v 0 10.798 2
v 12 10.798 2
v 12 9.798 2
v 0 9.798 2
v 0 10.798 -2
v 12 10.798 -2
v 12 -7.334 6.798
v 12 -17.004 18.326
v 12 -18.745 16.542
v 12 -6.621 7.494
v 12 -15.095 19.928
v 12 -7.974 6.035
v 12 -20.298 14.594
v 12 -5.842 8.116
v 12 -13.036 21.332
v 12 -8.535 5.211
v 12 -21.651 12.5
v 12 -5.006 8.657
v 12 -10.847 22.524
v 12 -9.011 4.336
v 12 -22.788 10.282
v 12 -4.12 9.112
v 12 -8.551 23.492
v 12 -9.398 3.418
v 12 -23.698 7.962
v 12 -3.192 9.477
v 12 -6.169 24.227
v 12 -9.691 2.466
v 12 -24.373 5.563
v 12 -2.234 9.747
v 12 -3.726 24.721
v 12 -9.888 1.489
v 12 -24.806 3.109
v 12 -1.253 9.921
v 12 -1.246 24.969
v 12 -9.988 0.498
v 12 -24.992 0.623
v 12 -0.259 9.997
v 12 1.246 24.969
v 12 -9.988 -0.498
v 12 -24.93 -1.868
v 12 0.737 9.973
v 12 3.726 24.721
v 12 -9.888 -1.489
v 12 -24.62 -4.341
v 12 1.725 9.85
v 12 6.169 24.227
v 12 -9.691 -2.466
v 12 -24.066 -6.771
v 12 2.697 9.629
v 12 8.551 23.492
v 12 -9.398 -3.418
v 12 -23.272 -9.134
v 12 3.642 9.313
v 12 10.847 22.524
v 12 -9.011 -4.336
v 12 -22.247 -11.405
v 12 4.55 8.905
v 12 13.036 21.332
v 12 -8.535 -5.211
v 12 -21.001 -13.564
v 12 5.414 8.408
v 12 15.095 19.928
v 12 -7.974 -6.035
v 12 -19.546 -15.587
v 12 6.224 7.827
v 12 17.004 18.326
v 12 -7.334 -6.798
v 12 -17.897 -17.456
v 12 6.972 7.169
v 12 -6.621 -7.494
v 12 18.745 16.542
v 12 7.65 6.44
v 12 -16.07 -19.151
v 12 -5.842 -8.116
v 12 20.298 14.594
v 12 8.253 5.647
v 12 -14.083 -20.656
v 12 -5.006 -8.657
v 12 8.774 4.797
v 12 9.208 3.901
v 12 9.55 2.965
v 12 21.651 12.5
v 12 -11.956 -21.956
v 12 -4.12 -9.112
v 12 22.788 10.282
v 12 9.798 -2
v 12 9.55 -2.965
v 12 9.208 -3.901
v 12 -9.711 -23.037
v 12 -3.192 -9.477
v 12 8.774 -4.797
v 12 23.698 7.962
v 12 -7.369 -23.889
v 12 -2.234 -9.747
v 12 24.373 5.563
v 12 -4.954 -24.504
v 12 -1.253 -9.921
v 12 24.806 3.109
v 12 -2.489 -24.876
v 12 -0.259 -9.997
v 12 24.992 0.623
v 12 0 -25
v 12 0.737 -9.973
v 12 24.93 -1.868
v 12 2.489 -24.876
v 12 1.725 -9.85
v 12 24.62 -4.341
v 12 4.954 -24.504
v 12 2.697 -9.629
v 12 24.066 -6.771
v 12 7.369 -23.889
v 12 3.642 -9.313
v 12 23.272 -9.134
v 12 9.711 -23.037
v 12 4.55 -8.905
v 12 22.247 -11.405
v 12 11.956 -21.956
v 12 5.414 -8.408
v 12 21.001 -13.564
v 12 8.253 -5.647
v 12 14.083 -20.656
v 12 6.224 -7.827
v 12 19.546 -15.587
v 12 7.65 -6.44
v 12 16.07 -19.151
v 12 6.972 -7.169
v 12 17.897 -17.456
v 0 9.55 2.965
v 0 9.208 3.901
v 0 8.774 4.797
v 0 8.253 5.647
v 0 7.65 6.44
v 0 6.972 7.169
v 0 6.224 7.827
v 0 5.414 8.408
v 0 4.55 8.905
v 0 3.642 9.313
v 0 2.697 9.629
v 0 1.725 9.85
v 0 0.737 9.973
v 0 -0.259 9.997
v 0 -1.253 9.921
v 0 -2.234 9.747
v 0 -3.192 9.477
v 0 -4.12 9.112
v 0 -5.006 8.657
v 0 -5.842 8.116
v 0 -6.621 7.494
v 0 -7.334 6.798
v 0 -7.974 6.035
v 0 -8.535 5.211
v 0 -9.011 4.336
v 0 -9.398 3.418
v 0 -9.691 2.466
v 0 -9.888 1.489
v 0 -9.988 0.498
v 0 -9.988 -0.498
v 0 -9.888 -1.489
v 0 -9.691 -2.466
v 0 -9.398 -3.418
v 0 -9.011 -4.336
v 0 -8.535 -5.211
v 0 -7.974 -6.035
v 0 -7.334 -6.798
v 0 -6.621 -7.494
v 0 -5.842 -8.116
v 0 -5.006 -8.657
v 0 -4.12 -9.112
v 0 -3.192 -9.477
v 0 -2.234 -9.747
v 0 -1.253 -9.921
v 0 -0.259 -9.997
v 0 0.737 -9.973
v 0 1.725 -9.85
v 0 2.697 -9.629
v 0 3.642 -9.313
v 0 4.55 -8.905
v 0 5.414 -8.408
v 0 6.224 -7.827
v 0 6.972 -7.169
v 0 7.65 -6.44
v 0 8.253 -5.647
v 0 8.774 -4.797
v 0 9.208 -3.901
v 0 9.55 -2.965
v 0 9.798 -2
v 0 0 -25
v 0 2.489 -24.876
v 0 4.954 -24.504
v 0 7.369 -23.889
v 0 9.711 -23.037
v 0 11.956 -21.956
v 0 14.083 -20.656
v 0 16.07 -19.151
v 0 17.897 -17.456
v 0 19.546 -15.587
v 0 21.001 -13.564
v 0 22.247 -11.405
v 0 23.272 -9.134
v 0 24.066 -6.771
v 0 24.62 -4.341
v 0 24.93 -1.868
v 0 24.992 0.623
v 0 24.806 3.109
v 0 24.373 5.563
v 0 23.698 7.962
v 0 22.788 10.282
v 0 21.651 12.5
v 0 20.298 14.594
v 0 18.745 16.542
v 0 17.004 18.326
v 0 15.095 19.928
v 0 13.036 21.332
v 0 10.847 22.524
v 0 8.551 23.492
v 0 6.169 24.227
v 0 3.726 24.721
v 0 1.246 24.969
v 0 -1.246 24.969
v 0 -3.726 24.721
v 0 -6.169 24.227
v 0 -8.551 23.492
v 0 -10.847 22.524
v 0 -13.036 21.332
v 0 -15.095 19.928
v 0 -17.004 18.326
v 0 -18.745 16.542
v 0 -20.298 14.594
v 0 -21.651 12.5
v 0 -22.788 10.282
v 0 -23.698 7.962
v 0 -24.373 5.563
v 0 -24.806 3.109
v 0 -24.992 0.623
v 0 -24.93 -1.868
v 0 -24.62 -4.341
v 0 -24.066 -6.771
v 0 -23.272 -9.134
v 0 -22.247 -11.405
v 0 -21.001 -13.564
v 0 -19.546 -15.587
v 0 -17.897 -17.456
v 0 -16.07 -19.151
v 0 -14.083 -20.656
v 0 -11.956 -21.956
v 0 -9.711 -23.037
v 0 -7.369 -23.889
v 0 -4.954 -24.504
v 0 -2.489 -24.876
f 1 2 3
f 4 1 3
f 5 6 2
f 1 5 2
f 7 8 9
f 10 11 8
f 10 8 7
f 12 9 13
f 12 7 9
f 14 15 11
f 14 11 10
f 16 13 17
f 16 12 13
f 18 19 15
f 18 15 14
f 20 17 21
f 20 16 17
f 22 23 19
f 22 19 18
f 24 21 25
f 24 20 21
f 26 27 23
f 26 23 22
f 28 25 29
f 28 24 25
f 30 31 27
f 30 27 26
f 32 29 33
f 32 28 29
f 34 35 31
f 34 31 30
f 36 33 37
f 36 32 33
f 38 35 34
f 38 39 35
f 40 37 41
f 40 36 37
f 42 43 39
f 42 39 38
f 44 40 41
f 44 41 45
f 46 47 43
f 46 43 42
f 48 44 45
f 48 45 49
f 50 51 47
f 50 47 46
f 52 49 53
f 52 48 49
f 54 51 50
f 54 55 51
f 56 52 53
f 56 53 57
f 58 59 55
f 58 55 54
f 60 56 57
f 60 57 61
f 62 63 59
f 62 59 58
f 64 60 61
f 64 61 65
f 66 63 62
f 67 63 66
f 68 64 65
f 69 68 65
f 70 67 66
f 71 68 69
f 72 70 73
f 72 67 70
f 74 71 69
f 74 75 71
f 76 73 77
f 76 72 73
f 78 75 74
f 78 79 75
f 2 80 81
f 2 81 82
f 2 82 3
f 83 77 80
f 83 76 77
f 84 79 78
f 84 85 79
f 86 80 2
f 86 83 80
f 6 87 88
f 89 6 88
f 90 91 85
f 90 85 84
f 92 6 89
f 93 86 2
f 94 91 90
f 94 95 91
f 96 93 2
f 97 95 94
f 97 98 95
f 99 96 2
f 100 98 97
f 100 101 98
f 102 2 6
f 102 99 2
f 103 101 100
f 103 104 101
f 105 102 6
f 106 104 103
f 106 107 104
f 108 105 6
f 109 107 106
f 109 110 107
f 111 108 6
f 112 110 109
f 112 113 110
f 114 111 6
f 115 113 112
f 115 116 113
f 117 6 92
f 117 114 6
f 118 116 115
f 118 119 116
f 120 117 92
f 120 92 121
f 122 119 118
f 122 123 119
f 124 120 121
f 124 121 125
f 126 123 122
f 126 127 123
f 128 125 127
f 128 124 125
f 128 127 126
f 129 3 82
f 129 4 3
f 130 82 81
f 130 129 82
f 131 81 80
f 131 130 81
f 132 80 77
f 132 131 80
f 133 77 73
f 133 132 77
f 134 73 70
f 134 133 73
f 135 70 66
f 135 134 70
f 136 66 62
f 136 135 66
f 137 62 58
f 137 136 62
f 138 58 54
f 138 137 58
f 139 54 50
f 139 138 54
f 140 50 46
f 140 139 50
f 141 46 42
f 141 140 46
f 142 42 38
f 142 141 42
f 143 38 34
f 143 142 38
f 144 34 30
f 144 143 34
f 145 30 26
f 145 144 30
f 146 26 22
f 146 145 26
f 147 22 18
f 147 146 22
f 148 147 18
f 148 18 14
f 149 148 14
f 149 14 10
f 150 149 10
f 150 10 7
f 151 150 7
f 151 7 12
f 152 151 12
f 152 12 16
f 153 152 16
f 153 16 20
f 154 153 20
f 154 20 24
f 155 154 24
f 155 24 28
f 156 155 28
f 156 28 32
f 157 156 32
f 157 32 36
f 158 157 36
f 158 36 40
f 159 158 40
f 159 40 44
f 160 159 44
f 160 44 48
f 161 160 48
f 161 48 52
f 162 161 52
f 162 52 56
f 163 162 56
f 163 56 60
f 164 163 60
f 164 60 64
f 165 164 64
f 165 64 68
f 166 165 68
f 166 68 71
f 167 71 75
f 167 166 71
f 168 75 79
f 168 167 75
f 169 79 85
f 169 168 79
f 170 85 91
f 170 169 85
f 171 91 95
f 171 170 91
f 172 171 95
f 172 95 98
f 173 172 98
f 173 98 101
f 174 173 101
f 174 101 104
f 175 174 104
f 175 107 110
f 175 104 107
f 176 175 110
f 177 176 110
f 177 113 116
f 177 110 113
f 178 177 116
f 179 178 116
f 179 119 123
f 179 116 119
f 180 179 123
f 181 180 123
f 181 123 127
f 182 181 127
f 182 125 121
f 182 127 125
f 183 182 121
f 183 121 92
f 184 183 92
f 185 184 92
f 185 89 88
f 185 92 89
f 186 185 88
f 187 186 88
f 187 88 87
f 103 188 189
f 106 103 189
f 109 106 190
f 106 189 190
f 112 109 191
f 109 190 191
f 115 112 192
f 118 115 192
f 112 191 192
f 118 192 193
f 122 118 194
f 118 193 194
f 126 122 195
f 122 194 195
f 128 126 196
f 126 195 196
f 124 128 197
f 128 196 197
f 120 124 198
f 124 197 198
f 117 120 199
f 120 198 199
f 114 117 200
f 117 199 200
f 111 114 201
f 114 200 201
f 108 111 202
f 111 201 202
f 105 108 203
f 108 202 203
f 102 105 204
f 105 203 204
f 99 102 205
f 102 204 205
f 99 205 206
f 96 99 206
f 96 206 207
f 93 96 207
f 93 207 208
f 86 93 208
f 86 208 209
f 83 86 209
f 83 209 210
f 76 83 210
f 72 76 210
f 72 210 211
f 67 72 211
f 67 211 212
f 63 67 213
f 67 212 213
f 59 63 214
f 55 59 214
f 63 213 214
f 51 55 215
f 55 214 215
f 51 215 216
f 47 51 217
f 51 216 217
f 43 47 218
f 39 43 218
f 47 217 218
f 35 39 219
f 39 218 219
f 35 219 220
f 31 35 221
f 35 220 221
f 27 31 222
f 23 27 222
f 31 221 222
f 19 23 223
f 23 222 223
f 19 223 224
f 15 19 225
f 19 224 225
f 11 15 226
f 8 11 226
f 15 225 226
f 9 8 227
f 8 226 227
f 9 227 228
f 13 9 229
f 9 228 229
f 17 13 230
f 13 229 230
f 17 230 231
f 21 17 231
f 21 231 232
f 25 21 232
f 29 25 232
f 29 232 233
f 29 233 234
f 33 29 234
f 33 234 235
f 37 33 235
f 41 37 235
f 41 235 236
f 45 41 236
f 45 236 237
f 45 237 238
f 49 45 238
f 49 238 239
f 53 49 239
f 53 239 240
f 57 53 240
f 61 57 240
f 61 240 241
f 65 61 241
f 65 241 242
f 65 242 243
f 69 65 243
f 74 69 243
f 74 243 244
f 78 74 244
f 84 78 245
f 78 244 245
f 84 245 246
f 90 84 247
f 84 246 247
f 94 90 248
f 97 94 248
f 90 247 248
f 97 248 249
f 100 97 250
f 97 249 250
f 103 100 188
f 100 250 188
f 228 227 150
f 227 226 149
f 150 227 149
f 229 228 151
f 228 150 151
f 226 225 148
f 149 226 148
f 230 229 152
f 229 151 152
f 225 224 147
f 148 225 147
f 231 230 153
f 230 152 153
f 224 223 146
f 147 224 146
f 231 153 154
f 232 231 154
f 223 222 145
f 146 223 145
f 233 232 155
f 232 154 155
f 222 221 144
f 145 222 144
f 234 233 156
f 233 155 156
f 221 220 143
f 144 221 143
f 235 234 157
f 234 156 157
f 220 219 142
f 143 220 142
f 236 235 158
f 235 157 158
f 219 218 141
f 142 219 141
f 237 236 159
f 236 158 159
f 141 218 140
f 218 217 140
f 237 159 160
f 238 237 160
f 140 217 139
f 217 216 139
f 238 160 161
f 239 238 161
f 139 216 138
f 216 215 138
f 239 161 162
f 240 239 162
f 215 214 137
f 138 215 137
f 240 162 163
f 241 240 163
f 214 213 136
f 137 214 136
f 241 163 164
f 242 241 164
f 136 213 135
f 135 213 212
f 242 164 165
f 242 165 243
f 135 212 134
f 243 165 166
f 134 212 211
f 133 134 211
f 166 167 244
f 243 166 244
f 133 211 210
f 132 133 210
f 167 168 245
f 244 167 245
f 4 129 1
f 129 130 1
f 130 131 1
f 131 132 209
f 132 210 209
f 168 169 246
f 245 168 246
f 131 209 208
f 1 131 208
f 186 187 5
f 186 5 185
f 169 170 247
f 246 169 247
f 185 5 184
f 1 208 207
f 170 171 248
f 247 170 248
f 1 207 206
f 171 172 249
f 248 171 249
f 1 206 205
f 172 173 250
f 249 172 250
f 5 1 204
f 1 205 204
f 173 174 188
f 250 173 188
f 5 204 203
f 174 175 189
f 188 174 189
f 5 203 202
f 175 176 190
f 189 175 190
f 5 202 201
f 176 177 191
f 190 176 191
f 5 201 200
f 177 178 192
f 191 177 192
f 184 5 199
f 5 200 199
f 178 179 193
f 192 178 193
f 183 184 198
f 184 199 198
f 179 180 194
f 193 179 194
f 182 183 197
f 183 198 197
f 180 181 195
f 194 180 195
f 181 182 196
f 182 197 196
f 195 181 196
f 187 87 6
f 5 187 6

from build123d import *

# Parameters (mm, degrees)
SKETCH1_R           = 25
SKETCH1_R_2         = 10
BOSS_EXTRUDE1_DEPTH = 12
CUT_EXTRUDE1_DEPTH  = 38.336309405


with BuildPart() as part:
    # Sketch1 → Boss-Extrude1 (new body)
    with BuildSketch(Plane(origin=(0, 0, 0), x_dir=(0, 0, -1), z_dir=(1, 0, 0))):
        Circle(SKETCH1_R)
        Circle(SKETCH1_R_2, mode=Mode.SUBTRACT)
    extrude(amount=BOSS_EXTRUDE1_DEPTH)

    # Sketch2 → Cut-Extrude1 (cut, through all)
    with BuildSketch(Plane(origin=(12, 0, 0), x_dir=(0, 0, -1), z_dir=(1, 0, 0))):
        with BuildLine():
            ThreePointArc((-2, 9.797958971), (-1.00508962, 9.94936153), (0, 10))
            Line((0, 10), (0, 10.797958971))
            Line((0, 10.797958971), (-2, 10.797958971))
            Line((-2, 10.797958971), (-2, 9.797958971))
        make_face()
        with BuildLine():
            Line((0, 10.797958971), (0, 10))
            ThreePointArc((0, 10), (1.00508962, 9.94936153), (2, 9.797958971))
            Line((2, 9.797958971), (2, 10.797958971))
            Line((2, 10.797958971), (0, 10.797958971))
        make_face()
    extrude(amount=-CUT_EXTRUDE1_DEPTH, mode=Mode.SUBTRACT)


solid = part.part
